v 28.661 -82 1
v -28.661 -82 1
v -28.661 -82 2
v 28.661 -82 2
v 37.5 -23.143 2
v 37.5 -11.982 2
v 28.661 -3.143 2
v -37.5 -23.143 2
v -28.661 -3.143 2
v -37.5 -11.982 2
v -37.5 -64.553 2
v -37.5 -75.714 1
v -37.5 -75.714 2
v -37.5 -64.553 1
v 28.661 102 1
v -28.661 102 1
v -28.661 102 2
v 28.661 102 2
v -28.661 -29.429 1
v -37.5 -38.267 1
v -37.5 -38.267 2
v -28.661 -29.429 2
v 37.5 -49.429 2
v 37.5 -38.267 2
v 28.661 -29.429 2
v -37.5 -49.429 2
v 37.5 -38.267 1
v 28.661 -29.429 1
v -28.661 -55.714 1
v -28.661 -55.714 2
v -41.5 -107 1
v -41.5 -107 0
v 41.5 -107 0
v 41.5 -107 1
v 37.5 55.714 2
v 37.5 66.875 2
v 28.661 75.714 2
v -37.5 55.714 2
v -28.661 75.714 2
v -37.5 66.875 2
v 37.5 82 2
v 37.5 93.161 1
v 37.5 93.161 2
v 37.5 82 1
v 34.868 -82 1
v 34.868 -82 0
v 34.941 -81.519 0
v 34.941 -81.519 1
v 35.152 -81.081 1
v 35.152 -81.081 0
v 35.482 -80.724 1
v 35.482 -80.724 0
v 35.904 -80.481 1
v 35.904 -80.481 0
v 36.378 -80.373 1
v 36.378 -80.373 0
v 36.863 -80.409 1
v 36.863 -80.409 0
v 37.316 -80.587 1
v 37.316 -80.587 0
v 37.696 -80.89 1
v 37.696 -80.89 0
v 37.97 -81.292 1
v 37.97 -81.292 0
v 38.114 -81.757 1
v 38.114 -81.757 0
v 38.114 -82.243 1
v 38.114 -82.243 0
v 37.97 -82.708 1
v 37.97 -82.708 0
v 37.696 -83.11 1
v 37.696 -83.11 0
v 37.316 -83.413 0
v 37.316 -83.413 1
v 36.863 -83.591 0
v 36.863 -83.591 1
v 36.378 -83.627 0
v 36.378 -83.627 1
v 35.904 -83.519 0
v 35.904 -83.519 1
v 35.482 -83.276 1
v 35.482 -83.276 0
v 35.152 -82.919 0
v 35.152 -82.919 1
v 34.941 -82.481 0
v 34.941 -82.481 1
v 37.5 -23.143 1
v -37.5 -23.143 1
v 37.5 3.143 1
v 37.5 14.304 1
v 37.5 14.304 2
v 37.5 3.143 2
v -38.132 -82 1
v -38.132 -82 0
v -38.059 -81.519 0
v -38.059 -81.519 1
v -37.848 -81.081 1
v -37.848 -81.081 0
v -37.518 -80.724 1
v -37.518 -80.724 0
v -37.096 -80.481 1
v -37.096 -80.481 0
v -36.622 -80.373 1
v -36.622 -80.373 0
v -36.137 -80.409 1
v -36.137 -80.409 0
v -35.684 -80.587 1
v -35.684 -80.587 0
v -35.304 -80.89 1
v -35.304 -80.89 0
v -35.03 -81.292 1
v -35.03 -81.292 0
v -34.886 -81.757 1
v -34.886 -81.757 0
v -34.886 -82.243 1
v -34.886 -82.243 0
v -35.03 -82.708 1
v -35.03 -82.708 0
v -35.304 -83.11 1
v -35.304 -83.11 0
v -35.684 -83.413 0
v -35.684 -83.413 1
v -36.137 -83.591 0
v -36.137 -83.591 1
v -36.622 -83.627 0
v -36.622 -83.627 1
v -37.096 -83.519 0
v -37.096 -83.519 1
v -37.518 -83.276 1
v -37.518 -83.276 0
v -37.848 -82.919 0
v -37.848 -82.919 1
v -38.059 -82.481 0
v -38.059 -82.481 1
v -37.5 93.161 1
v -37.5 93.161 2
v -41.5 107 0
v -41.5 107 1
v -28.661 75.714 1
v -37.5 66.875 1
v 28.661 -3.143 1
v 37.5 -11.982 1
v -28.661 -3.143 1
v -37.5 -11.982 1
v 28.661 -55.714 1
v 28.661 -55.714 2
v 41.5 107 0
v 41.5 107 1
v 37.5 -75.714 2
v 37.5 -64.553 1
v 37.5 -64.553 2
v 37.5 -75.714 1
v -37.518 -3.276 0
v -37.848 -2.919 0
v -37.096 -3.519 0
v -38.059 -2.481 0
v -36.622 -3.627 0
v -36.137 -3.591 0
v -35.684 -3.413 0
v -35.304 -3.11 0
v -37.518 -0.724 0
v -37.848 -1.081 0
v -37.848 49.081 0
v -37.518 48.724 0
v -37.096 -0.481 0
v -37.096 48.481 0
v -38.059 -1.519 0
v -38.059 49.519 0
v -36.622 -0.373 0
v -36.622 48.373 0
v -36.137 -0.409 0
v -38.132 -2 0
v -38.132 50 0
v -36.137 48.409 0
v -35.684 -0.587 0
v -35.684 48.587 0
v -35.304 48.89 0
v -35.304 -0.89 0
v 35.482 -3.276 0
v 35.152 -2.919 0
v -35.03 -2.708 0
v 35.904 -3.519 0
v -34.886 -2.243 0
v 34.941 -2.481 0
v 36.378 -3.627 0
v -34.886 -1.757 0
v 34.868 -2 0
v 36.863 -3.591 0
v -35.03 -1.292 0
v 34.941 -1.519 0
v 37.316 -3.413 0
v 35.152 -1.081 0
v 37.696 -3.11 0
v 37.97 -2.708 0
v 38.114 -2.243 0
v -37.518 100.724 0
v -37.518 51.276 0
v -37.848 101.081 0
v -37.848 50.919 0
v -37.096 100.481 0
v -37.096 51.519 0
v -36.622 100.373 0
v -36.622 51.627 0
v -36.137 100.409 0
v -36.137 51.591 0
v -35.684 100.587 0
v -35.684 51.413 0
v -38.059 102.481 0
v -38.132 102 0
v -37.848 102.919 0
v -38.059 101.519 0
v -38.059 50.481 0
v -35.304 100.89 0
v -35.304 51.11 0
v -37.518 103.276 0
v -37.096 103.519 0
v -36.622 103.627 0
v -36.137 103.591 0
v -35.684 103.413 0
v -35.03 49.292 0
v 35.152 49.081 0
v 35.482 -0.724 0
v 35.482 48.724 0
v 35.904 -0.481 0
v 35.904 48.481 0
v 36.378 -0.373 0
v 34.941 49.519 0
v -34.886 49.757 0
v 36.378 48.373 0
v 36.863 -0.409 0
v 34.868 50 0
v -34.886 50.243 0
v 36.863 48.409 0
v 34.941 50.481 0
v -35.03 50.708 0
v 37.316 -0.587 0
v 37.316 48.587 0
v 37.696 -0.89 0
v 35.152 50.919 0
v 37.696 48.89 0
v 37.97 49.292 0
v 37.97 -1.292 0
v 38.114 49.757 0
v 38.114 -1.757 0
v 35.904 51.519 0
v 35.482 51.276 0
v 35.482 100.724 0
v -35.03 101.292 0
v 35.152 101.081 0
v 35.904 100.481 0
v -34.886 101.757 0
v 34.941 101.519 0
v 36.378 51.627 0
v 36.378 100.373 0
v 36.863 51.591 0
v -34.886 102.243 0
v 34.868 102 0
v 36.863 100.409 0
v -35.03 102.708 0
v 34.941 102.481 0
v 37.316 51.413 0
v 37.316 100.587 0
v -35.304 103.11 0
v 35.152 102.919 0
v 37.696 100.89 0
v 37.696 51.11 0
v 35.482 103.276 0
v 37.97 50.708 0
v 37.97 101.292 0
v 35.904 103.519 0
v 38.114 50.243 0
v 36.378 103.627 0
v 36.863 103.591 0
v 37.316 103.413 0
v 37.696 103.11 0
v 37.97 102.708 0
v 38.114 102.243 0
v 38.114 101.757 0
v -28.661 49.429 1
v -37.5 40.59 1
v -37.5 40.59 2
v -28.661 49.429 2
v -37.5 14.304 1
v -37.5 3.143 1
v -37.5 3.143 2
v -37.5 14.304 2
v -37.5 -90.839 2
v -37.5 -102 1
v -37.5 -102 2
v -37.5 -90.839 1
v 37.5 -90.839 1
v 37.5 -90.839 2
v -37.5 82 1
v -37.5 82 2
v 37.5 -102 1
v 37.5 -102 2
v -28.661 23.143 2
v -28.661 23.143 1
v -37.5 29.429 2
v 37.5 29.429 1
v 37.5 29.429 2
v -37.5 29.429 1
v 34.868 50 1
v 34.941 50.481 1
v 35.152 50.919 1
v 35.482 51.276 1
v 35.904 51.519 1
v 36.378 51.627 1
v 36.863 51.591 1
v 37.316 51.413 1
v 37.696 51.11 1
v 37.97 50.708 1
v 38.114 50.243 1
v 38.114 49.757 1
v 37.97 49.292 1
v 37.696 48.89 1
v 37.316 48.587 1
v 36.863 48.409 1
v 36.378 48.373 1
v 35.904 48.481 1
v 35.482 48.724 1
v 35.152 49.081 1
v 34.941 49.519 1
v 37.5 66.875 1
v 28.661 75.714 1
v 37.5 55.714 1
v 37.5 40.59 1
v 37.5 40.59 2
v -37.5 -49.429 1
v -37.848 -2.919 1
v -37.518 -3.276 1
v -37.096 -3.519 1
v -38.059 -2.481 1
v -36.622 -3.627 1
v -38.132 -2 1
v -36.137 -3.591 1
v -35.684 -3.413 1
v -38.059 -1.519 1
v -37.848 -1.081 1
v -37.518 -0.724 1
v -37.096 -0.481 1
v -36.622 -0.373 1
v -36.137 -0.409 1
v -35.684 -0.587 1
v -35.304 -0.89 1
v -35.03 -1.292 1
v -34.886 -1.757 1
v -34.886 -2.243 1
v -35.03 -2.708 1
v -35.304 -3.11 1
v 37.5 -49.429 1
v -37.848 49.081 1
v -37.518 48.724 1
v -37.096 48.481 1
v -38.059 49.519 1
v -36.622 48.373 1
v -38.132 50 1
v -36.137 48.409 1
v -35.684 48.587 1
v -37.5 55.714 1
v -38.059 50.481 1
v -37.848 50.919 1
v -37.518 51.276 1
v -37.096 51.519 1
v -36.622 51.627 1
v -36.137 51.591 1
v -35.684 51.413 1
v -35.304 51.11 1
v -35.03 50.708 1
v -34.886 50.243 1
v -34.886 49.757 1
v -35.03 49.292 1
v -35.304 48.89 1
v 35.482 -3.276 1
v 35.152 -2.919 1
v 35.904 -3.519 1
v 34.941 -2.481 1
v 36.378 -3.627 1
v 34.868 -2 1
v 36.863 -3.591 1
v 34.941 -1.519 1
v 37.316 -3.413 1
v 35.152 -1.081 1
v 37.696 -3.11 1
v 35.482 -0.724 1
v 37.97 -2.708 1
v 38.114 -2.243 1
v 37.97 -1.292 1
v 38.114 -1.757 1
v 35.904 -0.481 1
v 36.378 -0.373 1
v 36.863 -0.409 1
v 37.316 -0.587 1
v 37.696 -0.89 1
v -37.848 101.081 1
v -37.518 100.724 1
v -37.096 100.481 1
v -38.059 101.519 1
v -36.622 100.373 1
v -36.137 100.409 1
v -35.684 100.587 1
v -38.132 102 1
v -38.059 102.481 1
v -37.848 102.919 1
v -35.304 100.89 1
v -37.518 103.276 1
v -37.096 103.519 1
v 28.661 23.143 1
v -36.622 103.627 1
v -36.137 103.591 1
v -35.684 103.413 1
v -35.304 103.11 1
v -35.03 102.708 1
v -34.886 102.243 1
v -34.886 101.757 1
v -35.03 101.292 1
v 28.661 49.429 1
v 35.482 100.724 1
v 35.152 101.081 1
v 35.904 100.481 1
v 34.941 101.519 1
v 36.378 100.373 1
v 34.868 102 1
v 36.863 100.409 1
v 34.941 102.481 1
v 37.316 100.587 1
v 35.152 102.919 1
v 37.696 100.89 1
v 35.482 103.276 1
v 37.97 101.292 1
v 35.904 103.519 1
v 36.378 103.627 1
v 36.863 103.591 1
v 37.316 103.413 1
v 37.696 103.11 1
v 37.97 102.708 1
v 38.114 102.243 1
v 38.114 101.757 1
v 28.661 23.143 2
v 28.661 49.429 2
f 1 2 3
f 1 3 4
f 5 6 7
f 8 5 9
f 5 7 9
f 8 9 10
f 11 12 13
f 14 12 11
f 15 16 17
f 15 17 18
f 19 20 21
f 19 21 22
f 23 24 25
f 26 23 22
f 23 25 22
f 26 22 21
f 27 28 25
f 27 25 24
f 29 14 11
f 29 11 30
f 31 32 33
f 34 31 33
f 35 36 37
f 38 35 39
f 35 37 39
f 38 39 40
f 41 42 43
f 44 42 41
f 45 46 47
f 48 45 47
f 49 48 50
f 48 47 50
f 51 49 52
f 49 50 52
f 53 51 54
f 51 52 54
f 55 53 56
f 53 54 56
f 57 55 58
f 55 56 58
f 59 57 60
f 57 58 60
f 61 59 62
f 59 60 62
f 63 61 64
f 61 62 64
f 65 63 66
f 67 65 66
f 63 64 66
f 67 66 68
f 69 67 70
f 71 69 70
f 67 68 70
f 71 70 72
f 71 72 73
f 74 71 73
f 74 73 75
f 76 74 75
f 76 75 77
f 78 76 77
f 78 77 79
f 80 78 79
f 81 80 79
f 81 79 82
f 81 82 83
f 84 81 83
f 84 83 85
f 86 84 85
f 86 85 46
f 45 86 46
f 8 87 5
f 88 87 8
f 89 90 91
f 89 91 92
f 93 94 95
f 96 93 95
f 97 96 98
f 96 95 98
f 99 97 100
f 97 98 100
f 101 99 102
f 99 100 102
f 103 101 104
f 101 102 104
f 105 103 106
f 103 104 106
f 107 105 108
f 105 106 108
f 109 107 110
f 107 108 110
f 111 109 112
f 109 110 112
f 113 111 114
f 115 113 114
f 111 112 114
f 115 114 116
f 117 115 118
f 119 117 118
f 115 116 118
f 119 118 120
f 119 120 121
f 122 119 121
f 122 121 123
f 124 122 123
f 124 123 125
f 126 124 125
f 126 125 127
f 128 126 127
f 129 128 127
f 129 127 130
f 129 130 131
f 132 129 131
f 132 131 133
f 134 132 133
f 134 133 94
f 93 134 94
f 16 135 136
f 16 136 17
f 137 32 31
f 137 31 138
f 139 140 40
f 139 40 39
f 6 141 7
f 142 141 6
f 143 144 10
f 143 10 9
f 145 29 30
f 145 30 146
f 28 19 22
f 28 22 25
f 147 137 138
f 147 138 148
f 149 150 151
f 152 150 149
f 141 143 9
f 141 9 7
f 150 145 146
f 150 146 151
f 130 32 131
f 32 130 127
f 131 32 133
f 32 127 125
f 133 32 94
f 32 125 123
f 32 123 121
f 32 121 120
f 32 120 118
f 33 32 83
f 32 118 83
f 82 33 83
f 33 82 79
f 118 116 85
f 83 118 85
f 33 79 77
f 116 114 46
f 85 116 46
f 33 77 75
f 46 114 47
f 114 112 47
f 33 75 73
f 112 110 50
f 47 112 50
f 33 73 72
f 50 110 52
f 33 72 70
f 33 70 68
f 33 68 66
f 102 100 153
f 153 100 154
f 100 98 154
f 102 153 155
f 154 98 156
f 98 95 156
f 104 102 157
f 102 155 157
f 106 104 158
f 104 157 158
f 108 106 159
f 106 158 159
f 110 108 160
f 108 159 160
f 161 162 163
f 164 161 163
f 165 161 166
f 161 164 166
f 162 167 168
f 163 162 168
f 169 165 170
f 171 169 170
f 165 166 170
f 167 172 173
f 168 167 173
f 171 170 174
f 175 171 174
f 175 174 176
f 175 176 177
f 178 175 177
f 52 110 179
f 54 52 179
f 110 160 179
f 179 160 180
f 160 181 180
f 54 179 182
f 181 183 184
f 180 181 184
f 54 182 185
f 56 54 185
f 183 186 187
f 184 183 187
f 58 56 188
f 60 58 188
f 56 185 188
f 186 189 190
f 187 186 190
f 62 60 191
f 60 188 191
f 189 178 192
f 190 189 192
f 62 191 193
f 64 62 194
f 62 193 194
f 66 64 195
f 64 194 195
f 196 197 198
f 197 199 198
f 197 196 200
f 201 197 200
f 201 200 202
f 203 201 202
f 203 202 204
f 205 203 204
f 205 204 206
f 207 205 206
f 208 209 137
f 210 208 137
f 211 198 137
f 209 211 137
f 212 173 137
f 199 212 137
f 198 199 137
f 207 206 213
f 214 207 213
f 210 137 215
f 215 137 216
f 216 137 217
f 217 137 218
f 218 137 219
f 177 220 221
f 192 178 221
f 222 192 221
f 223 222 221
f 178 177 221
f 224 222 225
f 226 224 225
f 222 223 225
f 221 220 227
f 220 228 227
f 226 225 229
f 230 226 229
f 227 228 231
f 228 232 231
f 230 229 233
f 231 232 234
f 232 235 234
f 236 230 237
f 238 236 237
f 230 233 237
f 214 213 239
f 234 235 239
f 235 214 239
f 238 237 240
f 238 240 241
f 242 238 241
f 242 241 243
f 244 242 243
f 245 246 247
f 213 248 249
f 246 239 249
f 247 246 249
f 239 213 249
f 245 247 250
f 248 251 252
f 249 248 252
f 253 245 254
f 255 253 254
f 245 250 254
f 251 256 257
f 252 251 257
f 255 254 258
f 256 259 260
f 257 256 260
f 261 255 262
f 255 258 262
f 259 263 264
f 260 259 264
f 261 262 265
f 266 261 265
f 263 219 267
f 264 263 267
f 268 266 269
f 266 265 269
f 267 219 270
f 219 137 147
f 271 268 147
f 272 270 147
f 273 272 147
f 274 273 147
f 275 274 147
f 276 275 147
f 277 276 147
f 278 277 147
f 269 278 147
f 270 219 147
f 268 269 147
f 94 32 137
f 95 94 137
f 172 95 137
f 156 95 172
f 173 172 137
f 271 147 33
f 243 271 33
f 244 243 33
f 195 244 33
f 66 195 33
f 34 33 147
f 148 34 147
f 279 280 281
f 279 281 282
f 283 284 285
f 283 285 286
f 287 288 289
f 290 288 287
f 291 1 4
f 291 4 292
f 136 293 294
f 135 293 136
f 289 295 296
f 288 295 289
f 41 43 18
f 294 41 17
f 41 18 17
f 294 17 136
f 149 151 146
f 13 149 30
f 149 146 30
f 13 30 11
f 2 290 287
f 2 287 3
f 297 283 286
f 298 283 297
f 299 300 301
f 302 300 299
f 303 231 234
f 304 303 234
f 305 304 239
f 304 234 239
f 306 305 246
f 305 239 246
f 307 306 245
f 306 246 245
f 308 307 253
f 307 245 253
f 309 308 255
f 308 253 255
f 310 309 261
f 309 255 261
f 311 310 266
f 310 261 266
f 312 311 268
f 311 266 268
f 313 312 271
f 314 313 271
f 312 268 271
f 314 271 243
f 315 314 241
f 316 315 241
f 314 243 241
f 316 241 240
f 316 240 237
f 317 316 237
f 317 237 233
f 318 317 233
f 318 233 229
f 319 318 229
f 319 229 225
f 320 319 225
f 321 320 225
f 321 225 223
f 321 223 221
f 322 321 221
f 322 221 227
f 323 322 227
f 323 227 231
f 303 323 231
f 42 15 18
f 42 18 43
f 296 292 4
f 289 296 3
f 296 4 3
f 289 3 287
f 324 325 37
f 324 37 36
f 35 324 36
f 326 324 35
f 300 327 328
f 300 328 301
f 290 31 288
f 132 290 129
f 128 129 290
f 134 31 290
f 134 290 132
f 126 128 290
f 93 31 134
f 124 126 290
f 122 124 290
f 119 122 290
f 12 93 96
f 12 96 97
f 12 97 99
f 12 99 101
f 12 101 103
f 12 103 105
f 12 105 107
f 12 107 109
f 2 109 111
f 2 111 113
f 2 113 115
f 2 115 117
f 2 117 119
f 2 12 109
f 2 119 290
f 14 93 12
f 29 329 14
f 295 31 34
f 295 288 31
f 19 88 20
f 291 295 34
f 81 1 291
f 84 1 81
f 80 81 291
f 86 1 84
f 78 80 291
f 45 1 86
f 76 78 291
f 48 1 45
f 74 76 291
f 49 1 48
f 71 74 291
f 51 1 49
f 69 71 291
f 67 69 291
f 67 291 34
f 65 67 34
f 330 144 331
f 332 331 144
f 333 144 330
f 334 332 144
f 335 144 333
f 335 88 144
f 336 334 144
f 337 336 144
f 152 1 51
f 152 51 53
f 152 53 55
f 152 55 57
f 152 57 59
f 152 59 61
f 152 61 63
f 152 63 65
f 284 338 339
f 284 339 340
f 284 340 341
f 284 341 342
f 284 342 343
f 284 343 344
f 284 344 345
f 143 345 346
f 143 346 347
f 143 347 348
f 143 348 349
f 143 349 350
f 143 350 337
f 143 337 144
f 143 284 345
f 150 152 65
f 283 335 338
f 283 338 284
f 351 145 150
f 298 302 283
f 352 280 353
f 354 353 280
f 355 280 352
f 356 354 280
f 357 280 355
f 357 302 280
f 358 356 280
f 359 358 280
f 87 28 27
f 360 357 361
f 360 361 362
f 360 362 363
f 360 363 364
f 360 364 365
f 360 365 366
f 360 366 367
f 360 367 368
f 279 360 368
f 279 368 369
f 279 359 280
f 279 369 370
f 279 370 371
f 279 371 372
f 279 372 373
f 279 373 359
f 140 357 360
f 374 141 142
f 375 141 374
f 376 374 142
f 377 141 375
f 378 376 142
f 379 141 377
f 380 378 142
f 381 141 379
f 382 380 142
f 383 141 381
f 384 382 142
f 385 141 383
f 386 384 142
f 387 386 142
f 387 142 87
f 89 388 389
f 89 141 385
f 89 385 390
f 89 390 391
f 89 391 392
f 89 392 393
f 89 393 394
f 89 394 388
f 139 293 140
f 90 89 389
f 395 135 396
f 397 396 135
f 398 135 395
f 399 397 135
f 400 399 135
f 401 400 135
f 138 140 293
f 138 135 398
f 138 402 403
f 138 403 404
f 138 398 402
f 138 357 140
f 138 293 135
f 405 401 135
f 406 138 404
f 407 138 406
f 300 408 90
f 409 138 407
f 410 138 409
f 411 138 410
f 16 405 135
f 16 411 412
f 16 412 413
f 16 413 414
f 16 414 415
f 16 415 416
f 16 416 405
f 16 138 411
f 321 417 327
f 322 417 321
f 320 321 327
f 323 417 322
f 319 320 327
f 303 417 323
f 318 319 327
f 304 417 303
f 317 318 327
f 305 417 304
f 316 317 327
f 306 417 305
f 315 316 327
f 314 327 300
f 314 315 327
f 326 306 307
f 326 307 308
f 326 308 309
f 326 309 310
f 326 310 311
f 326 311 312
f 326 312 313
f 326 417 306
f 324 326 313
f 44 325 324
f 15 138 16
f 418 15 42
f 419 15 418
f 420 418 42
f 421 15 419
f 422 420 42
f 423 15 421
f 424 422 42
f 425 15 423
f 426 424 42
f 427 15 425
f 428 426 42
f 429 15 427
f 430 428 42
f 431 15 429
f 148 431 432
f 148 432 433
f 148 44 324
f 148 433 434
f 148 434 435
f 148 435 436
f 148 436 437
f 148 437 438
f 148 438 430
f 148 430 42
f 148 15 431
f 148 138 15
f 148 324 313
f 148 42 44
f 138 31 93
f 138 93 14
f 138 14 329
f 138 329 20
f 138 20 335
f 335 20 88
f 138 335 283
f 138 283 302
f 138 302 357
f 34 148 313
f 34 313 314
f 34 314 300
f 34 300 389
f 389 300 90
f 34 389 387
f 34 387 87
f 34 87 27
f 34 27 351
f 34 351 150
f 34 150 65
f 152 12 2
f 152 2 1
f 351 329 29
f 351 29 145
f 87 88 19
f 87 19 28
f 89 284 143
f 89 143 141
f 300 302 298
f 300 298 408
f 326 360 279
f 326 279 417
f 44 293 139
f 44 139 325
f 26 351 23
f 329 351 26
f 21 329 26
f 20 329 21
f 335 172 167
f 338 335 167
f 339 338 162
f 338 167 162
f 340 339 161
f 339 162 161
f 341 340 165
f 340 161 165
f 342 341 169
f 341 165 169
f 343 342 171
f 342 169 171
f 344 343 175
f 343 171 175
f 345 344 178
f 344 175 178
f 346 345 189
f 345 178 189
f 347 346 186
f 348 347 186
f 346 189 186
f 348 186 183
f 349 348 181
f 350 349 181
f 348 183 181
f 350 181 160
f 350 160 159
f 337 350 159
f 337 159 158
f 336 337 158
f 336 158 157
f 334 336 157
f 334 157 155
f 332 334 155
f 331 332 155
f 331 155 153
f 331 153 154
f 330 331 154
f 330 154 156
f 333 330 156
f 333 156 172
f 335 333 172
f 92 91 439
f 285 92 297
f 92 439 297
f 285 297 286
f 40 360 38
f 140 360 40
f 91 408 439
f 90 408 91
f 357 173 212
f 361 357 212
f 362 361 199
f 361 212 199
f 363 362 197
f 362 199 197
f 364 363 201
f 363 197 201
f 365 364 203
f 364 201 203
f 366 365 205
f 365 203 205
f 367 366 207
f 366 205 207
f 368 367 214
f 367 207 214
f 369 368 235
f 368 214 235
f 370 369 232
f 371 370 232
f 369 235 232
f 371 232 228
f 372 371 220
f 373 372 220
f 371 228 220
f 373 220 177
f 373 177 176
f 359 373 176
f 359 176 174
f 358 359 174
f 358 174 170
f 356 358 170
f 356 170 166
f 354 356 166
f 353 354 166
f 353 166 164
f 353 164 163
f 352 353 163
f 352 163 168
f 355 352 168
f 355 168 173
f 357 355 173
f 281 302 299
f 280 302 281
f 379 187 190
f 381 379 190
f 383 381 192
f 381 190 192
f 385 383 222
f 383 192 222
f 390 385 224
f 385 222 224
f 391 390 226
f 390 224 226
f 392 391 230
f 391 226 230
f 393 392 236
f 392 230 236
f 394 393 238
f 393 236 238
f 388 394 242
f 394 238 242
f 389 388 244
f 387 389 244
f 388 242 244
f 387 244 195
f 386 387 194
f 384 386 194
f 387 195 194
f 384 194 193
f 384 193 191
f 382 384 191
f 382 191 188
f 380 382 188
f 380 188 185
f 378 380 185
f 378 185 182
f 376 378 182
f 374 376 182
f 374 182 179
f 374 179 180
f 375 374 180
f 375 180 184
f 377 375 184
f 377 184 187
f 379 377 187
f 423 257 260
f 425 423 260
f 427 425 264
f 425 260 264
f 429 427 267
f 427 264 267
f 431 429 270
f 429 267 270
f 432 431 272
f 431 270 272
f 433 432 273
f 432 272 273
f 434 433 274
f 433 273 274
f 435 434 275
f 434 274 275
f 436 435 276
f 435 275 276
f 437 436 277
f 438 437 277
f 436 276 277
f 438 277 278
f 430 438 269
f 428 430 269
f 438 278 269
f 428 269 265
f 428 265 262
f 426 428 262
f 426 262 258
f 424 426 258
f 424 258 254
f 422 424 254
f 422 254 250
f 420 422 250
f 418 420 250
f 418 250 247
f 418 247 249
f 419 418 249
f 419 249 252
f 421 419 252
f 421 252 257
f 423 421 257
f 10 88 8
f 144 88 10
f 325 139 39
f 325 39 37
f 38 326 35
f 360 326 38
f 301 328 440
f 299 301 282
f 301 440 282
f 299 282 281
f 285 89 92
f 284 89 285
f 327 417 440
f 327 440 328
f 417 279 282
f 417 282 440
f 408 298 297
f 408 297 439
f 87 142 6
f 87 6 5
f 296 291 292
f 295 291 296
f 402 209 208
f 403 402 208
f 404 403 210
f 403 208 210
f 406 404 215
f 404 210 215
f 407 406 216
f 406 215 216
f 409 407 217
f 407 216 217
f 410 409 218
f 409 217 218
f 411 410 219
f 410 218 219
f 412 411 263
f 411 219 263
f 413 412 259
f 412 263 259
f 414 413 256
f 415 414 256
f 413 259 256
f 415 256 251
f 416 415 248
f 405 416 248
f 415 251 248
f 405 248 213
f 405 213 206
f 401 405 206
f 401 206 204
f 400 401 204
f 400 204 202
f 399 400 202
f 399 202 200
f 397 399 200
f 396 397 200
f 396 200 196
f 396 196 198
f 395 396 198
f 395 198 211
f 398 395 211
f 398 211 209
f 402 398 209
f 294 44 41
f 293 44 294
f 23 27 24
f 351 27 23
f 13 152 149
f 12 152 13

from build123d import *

# Parameters (mm, degrees)
SKETCH1_W                 = 83
SKETCH1_H                 = 214
BOSS_EXTRUDE1_DEPTH       = 1
BOSS_EXTRUDE2_DEPTH       = 1
F_4_CLEARANCE_HOLE1_D     = 3.2639
F_4_CLEARANCE_HOLE1_DEPTH = 3.175
F_4_CLEARANCE_HOLE1_TIP   = 0.980574487


with BuildPart() as part:
    # Sketch1 → Boss-Extrude1 (new body)
    with BuildSketch(Plane.XY):
        Rectangle(SKETCH1_W, SKETCH1_H)
    extrude(amount=BOSS_EXTRUDE1_DEPTH)

    # Sketch2 → Boss-Extrude2 (add)
    with BuildSketch(Plane.XY.offset(1)):
        Polygon((-28.661165235, 102), (28.661165235, 102), (37.5, 93.161165235), (37.5, 82), (-37.5, 82), (-37.5, 93.161165235), align=None)
        Polygon((-28.661165235, 75.714285714), (28.661165235, 75.714285714), (37.5, 66.875450949), (37.5, 55.714285714), (-37.5, 55.714285714), (-37.5, 66.875450949), align=None)
        Polygon((-28.661165235, 49.428571429), (28.661165235, 49.428571429), (37.5, 40.589736664), (37.5, 29.428571429), (-37.5, 29.428571429), (-37.5, 40.589736664), align=None)
        Polygon((-28.661165235, 23.142857143), (28.661165235, 23.142857143), (37.5, 14.304022378), (37.5, 3.142857143), (-37.5, 3.142857143), (-37.5, 14.304022378), align=None)
        Polygon((-28.661165235, -3.142857143), (28.661165235, -3.142857143), (37.5, -11.981691908), (37.5, -23.142857143), (-37.5, -23.142857143), (-37.5, -11.981691908), align=None)
        Polygon((-28.661165235, -29.428571429), (28.661165235, -29.428571429), (37.5, -38.267406193), (37.5, -49.428571429), (-37.5, -49.428571429), (-37.5, -38.267406193), align=None)
        Polygon((-28.661165235, -55.714285714), (28.661165235, -55.714285714), (37.5, -64.553120479), (37.5, -75.714285714), (-37.5, -75.714285714), (-37.5, -64.553120479), align=None)
        Polygon((-28.661165235, -82), (28.661165235, -82), (37.5, -90.838834765), (37.5, -102), (-37.5, -102), (-37.5, -90.838834765), align=None)
    extrude(amount=BOSS_EXTRUDE2_DEPTH)

    # #4 Clearance Hole1
    with Locations(Plane.XY.offset(1)):
        with Locations((-36.5, 102), (36.5, 102), (36.5, 50), (36.5, -2), (36.5, -82), (-36.5, -82), (-36.5, -2), (-36.5, 50)):
            Hole(F_4_CLEARANCE_HOLE1_D / 2, depth=F_4_CLEARANCE_HOLE1_DEPTH)
            with Locations((0, 0, -(F_4_CLEARANCE_HOLE1_DEPTH + F_4_CLEARANCE_HOLE1_TIP / 2))):  # 118° drill point
                Cone(0, F_4_CLEARANCE_HOLE1_D / 2, F_4_CLEARANCE_HOLE1_TIP, mode=Mode.SUBTRACT)


solid = part.part
